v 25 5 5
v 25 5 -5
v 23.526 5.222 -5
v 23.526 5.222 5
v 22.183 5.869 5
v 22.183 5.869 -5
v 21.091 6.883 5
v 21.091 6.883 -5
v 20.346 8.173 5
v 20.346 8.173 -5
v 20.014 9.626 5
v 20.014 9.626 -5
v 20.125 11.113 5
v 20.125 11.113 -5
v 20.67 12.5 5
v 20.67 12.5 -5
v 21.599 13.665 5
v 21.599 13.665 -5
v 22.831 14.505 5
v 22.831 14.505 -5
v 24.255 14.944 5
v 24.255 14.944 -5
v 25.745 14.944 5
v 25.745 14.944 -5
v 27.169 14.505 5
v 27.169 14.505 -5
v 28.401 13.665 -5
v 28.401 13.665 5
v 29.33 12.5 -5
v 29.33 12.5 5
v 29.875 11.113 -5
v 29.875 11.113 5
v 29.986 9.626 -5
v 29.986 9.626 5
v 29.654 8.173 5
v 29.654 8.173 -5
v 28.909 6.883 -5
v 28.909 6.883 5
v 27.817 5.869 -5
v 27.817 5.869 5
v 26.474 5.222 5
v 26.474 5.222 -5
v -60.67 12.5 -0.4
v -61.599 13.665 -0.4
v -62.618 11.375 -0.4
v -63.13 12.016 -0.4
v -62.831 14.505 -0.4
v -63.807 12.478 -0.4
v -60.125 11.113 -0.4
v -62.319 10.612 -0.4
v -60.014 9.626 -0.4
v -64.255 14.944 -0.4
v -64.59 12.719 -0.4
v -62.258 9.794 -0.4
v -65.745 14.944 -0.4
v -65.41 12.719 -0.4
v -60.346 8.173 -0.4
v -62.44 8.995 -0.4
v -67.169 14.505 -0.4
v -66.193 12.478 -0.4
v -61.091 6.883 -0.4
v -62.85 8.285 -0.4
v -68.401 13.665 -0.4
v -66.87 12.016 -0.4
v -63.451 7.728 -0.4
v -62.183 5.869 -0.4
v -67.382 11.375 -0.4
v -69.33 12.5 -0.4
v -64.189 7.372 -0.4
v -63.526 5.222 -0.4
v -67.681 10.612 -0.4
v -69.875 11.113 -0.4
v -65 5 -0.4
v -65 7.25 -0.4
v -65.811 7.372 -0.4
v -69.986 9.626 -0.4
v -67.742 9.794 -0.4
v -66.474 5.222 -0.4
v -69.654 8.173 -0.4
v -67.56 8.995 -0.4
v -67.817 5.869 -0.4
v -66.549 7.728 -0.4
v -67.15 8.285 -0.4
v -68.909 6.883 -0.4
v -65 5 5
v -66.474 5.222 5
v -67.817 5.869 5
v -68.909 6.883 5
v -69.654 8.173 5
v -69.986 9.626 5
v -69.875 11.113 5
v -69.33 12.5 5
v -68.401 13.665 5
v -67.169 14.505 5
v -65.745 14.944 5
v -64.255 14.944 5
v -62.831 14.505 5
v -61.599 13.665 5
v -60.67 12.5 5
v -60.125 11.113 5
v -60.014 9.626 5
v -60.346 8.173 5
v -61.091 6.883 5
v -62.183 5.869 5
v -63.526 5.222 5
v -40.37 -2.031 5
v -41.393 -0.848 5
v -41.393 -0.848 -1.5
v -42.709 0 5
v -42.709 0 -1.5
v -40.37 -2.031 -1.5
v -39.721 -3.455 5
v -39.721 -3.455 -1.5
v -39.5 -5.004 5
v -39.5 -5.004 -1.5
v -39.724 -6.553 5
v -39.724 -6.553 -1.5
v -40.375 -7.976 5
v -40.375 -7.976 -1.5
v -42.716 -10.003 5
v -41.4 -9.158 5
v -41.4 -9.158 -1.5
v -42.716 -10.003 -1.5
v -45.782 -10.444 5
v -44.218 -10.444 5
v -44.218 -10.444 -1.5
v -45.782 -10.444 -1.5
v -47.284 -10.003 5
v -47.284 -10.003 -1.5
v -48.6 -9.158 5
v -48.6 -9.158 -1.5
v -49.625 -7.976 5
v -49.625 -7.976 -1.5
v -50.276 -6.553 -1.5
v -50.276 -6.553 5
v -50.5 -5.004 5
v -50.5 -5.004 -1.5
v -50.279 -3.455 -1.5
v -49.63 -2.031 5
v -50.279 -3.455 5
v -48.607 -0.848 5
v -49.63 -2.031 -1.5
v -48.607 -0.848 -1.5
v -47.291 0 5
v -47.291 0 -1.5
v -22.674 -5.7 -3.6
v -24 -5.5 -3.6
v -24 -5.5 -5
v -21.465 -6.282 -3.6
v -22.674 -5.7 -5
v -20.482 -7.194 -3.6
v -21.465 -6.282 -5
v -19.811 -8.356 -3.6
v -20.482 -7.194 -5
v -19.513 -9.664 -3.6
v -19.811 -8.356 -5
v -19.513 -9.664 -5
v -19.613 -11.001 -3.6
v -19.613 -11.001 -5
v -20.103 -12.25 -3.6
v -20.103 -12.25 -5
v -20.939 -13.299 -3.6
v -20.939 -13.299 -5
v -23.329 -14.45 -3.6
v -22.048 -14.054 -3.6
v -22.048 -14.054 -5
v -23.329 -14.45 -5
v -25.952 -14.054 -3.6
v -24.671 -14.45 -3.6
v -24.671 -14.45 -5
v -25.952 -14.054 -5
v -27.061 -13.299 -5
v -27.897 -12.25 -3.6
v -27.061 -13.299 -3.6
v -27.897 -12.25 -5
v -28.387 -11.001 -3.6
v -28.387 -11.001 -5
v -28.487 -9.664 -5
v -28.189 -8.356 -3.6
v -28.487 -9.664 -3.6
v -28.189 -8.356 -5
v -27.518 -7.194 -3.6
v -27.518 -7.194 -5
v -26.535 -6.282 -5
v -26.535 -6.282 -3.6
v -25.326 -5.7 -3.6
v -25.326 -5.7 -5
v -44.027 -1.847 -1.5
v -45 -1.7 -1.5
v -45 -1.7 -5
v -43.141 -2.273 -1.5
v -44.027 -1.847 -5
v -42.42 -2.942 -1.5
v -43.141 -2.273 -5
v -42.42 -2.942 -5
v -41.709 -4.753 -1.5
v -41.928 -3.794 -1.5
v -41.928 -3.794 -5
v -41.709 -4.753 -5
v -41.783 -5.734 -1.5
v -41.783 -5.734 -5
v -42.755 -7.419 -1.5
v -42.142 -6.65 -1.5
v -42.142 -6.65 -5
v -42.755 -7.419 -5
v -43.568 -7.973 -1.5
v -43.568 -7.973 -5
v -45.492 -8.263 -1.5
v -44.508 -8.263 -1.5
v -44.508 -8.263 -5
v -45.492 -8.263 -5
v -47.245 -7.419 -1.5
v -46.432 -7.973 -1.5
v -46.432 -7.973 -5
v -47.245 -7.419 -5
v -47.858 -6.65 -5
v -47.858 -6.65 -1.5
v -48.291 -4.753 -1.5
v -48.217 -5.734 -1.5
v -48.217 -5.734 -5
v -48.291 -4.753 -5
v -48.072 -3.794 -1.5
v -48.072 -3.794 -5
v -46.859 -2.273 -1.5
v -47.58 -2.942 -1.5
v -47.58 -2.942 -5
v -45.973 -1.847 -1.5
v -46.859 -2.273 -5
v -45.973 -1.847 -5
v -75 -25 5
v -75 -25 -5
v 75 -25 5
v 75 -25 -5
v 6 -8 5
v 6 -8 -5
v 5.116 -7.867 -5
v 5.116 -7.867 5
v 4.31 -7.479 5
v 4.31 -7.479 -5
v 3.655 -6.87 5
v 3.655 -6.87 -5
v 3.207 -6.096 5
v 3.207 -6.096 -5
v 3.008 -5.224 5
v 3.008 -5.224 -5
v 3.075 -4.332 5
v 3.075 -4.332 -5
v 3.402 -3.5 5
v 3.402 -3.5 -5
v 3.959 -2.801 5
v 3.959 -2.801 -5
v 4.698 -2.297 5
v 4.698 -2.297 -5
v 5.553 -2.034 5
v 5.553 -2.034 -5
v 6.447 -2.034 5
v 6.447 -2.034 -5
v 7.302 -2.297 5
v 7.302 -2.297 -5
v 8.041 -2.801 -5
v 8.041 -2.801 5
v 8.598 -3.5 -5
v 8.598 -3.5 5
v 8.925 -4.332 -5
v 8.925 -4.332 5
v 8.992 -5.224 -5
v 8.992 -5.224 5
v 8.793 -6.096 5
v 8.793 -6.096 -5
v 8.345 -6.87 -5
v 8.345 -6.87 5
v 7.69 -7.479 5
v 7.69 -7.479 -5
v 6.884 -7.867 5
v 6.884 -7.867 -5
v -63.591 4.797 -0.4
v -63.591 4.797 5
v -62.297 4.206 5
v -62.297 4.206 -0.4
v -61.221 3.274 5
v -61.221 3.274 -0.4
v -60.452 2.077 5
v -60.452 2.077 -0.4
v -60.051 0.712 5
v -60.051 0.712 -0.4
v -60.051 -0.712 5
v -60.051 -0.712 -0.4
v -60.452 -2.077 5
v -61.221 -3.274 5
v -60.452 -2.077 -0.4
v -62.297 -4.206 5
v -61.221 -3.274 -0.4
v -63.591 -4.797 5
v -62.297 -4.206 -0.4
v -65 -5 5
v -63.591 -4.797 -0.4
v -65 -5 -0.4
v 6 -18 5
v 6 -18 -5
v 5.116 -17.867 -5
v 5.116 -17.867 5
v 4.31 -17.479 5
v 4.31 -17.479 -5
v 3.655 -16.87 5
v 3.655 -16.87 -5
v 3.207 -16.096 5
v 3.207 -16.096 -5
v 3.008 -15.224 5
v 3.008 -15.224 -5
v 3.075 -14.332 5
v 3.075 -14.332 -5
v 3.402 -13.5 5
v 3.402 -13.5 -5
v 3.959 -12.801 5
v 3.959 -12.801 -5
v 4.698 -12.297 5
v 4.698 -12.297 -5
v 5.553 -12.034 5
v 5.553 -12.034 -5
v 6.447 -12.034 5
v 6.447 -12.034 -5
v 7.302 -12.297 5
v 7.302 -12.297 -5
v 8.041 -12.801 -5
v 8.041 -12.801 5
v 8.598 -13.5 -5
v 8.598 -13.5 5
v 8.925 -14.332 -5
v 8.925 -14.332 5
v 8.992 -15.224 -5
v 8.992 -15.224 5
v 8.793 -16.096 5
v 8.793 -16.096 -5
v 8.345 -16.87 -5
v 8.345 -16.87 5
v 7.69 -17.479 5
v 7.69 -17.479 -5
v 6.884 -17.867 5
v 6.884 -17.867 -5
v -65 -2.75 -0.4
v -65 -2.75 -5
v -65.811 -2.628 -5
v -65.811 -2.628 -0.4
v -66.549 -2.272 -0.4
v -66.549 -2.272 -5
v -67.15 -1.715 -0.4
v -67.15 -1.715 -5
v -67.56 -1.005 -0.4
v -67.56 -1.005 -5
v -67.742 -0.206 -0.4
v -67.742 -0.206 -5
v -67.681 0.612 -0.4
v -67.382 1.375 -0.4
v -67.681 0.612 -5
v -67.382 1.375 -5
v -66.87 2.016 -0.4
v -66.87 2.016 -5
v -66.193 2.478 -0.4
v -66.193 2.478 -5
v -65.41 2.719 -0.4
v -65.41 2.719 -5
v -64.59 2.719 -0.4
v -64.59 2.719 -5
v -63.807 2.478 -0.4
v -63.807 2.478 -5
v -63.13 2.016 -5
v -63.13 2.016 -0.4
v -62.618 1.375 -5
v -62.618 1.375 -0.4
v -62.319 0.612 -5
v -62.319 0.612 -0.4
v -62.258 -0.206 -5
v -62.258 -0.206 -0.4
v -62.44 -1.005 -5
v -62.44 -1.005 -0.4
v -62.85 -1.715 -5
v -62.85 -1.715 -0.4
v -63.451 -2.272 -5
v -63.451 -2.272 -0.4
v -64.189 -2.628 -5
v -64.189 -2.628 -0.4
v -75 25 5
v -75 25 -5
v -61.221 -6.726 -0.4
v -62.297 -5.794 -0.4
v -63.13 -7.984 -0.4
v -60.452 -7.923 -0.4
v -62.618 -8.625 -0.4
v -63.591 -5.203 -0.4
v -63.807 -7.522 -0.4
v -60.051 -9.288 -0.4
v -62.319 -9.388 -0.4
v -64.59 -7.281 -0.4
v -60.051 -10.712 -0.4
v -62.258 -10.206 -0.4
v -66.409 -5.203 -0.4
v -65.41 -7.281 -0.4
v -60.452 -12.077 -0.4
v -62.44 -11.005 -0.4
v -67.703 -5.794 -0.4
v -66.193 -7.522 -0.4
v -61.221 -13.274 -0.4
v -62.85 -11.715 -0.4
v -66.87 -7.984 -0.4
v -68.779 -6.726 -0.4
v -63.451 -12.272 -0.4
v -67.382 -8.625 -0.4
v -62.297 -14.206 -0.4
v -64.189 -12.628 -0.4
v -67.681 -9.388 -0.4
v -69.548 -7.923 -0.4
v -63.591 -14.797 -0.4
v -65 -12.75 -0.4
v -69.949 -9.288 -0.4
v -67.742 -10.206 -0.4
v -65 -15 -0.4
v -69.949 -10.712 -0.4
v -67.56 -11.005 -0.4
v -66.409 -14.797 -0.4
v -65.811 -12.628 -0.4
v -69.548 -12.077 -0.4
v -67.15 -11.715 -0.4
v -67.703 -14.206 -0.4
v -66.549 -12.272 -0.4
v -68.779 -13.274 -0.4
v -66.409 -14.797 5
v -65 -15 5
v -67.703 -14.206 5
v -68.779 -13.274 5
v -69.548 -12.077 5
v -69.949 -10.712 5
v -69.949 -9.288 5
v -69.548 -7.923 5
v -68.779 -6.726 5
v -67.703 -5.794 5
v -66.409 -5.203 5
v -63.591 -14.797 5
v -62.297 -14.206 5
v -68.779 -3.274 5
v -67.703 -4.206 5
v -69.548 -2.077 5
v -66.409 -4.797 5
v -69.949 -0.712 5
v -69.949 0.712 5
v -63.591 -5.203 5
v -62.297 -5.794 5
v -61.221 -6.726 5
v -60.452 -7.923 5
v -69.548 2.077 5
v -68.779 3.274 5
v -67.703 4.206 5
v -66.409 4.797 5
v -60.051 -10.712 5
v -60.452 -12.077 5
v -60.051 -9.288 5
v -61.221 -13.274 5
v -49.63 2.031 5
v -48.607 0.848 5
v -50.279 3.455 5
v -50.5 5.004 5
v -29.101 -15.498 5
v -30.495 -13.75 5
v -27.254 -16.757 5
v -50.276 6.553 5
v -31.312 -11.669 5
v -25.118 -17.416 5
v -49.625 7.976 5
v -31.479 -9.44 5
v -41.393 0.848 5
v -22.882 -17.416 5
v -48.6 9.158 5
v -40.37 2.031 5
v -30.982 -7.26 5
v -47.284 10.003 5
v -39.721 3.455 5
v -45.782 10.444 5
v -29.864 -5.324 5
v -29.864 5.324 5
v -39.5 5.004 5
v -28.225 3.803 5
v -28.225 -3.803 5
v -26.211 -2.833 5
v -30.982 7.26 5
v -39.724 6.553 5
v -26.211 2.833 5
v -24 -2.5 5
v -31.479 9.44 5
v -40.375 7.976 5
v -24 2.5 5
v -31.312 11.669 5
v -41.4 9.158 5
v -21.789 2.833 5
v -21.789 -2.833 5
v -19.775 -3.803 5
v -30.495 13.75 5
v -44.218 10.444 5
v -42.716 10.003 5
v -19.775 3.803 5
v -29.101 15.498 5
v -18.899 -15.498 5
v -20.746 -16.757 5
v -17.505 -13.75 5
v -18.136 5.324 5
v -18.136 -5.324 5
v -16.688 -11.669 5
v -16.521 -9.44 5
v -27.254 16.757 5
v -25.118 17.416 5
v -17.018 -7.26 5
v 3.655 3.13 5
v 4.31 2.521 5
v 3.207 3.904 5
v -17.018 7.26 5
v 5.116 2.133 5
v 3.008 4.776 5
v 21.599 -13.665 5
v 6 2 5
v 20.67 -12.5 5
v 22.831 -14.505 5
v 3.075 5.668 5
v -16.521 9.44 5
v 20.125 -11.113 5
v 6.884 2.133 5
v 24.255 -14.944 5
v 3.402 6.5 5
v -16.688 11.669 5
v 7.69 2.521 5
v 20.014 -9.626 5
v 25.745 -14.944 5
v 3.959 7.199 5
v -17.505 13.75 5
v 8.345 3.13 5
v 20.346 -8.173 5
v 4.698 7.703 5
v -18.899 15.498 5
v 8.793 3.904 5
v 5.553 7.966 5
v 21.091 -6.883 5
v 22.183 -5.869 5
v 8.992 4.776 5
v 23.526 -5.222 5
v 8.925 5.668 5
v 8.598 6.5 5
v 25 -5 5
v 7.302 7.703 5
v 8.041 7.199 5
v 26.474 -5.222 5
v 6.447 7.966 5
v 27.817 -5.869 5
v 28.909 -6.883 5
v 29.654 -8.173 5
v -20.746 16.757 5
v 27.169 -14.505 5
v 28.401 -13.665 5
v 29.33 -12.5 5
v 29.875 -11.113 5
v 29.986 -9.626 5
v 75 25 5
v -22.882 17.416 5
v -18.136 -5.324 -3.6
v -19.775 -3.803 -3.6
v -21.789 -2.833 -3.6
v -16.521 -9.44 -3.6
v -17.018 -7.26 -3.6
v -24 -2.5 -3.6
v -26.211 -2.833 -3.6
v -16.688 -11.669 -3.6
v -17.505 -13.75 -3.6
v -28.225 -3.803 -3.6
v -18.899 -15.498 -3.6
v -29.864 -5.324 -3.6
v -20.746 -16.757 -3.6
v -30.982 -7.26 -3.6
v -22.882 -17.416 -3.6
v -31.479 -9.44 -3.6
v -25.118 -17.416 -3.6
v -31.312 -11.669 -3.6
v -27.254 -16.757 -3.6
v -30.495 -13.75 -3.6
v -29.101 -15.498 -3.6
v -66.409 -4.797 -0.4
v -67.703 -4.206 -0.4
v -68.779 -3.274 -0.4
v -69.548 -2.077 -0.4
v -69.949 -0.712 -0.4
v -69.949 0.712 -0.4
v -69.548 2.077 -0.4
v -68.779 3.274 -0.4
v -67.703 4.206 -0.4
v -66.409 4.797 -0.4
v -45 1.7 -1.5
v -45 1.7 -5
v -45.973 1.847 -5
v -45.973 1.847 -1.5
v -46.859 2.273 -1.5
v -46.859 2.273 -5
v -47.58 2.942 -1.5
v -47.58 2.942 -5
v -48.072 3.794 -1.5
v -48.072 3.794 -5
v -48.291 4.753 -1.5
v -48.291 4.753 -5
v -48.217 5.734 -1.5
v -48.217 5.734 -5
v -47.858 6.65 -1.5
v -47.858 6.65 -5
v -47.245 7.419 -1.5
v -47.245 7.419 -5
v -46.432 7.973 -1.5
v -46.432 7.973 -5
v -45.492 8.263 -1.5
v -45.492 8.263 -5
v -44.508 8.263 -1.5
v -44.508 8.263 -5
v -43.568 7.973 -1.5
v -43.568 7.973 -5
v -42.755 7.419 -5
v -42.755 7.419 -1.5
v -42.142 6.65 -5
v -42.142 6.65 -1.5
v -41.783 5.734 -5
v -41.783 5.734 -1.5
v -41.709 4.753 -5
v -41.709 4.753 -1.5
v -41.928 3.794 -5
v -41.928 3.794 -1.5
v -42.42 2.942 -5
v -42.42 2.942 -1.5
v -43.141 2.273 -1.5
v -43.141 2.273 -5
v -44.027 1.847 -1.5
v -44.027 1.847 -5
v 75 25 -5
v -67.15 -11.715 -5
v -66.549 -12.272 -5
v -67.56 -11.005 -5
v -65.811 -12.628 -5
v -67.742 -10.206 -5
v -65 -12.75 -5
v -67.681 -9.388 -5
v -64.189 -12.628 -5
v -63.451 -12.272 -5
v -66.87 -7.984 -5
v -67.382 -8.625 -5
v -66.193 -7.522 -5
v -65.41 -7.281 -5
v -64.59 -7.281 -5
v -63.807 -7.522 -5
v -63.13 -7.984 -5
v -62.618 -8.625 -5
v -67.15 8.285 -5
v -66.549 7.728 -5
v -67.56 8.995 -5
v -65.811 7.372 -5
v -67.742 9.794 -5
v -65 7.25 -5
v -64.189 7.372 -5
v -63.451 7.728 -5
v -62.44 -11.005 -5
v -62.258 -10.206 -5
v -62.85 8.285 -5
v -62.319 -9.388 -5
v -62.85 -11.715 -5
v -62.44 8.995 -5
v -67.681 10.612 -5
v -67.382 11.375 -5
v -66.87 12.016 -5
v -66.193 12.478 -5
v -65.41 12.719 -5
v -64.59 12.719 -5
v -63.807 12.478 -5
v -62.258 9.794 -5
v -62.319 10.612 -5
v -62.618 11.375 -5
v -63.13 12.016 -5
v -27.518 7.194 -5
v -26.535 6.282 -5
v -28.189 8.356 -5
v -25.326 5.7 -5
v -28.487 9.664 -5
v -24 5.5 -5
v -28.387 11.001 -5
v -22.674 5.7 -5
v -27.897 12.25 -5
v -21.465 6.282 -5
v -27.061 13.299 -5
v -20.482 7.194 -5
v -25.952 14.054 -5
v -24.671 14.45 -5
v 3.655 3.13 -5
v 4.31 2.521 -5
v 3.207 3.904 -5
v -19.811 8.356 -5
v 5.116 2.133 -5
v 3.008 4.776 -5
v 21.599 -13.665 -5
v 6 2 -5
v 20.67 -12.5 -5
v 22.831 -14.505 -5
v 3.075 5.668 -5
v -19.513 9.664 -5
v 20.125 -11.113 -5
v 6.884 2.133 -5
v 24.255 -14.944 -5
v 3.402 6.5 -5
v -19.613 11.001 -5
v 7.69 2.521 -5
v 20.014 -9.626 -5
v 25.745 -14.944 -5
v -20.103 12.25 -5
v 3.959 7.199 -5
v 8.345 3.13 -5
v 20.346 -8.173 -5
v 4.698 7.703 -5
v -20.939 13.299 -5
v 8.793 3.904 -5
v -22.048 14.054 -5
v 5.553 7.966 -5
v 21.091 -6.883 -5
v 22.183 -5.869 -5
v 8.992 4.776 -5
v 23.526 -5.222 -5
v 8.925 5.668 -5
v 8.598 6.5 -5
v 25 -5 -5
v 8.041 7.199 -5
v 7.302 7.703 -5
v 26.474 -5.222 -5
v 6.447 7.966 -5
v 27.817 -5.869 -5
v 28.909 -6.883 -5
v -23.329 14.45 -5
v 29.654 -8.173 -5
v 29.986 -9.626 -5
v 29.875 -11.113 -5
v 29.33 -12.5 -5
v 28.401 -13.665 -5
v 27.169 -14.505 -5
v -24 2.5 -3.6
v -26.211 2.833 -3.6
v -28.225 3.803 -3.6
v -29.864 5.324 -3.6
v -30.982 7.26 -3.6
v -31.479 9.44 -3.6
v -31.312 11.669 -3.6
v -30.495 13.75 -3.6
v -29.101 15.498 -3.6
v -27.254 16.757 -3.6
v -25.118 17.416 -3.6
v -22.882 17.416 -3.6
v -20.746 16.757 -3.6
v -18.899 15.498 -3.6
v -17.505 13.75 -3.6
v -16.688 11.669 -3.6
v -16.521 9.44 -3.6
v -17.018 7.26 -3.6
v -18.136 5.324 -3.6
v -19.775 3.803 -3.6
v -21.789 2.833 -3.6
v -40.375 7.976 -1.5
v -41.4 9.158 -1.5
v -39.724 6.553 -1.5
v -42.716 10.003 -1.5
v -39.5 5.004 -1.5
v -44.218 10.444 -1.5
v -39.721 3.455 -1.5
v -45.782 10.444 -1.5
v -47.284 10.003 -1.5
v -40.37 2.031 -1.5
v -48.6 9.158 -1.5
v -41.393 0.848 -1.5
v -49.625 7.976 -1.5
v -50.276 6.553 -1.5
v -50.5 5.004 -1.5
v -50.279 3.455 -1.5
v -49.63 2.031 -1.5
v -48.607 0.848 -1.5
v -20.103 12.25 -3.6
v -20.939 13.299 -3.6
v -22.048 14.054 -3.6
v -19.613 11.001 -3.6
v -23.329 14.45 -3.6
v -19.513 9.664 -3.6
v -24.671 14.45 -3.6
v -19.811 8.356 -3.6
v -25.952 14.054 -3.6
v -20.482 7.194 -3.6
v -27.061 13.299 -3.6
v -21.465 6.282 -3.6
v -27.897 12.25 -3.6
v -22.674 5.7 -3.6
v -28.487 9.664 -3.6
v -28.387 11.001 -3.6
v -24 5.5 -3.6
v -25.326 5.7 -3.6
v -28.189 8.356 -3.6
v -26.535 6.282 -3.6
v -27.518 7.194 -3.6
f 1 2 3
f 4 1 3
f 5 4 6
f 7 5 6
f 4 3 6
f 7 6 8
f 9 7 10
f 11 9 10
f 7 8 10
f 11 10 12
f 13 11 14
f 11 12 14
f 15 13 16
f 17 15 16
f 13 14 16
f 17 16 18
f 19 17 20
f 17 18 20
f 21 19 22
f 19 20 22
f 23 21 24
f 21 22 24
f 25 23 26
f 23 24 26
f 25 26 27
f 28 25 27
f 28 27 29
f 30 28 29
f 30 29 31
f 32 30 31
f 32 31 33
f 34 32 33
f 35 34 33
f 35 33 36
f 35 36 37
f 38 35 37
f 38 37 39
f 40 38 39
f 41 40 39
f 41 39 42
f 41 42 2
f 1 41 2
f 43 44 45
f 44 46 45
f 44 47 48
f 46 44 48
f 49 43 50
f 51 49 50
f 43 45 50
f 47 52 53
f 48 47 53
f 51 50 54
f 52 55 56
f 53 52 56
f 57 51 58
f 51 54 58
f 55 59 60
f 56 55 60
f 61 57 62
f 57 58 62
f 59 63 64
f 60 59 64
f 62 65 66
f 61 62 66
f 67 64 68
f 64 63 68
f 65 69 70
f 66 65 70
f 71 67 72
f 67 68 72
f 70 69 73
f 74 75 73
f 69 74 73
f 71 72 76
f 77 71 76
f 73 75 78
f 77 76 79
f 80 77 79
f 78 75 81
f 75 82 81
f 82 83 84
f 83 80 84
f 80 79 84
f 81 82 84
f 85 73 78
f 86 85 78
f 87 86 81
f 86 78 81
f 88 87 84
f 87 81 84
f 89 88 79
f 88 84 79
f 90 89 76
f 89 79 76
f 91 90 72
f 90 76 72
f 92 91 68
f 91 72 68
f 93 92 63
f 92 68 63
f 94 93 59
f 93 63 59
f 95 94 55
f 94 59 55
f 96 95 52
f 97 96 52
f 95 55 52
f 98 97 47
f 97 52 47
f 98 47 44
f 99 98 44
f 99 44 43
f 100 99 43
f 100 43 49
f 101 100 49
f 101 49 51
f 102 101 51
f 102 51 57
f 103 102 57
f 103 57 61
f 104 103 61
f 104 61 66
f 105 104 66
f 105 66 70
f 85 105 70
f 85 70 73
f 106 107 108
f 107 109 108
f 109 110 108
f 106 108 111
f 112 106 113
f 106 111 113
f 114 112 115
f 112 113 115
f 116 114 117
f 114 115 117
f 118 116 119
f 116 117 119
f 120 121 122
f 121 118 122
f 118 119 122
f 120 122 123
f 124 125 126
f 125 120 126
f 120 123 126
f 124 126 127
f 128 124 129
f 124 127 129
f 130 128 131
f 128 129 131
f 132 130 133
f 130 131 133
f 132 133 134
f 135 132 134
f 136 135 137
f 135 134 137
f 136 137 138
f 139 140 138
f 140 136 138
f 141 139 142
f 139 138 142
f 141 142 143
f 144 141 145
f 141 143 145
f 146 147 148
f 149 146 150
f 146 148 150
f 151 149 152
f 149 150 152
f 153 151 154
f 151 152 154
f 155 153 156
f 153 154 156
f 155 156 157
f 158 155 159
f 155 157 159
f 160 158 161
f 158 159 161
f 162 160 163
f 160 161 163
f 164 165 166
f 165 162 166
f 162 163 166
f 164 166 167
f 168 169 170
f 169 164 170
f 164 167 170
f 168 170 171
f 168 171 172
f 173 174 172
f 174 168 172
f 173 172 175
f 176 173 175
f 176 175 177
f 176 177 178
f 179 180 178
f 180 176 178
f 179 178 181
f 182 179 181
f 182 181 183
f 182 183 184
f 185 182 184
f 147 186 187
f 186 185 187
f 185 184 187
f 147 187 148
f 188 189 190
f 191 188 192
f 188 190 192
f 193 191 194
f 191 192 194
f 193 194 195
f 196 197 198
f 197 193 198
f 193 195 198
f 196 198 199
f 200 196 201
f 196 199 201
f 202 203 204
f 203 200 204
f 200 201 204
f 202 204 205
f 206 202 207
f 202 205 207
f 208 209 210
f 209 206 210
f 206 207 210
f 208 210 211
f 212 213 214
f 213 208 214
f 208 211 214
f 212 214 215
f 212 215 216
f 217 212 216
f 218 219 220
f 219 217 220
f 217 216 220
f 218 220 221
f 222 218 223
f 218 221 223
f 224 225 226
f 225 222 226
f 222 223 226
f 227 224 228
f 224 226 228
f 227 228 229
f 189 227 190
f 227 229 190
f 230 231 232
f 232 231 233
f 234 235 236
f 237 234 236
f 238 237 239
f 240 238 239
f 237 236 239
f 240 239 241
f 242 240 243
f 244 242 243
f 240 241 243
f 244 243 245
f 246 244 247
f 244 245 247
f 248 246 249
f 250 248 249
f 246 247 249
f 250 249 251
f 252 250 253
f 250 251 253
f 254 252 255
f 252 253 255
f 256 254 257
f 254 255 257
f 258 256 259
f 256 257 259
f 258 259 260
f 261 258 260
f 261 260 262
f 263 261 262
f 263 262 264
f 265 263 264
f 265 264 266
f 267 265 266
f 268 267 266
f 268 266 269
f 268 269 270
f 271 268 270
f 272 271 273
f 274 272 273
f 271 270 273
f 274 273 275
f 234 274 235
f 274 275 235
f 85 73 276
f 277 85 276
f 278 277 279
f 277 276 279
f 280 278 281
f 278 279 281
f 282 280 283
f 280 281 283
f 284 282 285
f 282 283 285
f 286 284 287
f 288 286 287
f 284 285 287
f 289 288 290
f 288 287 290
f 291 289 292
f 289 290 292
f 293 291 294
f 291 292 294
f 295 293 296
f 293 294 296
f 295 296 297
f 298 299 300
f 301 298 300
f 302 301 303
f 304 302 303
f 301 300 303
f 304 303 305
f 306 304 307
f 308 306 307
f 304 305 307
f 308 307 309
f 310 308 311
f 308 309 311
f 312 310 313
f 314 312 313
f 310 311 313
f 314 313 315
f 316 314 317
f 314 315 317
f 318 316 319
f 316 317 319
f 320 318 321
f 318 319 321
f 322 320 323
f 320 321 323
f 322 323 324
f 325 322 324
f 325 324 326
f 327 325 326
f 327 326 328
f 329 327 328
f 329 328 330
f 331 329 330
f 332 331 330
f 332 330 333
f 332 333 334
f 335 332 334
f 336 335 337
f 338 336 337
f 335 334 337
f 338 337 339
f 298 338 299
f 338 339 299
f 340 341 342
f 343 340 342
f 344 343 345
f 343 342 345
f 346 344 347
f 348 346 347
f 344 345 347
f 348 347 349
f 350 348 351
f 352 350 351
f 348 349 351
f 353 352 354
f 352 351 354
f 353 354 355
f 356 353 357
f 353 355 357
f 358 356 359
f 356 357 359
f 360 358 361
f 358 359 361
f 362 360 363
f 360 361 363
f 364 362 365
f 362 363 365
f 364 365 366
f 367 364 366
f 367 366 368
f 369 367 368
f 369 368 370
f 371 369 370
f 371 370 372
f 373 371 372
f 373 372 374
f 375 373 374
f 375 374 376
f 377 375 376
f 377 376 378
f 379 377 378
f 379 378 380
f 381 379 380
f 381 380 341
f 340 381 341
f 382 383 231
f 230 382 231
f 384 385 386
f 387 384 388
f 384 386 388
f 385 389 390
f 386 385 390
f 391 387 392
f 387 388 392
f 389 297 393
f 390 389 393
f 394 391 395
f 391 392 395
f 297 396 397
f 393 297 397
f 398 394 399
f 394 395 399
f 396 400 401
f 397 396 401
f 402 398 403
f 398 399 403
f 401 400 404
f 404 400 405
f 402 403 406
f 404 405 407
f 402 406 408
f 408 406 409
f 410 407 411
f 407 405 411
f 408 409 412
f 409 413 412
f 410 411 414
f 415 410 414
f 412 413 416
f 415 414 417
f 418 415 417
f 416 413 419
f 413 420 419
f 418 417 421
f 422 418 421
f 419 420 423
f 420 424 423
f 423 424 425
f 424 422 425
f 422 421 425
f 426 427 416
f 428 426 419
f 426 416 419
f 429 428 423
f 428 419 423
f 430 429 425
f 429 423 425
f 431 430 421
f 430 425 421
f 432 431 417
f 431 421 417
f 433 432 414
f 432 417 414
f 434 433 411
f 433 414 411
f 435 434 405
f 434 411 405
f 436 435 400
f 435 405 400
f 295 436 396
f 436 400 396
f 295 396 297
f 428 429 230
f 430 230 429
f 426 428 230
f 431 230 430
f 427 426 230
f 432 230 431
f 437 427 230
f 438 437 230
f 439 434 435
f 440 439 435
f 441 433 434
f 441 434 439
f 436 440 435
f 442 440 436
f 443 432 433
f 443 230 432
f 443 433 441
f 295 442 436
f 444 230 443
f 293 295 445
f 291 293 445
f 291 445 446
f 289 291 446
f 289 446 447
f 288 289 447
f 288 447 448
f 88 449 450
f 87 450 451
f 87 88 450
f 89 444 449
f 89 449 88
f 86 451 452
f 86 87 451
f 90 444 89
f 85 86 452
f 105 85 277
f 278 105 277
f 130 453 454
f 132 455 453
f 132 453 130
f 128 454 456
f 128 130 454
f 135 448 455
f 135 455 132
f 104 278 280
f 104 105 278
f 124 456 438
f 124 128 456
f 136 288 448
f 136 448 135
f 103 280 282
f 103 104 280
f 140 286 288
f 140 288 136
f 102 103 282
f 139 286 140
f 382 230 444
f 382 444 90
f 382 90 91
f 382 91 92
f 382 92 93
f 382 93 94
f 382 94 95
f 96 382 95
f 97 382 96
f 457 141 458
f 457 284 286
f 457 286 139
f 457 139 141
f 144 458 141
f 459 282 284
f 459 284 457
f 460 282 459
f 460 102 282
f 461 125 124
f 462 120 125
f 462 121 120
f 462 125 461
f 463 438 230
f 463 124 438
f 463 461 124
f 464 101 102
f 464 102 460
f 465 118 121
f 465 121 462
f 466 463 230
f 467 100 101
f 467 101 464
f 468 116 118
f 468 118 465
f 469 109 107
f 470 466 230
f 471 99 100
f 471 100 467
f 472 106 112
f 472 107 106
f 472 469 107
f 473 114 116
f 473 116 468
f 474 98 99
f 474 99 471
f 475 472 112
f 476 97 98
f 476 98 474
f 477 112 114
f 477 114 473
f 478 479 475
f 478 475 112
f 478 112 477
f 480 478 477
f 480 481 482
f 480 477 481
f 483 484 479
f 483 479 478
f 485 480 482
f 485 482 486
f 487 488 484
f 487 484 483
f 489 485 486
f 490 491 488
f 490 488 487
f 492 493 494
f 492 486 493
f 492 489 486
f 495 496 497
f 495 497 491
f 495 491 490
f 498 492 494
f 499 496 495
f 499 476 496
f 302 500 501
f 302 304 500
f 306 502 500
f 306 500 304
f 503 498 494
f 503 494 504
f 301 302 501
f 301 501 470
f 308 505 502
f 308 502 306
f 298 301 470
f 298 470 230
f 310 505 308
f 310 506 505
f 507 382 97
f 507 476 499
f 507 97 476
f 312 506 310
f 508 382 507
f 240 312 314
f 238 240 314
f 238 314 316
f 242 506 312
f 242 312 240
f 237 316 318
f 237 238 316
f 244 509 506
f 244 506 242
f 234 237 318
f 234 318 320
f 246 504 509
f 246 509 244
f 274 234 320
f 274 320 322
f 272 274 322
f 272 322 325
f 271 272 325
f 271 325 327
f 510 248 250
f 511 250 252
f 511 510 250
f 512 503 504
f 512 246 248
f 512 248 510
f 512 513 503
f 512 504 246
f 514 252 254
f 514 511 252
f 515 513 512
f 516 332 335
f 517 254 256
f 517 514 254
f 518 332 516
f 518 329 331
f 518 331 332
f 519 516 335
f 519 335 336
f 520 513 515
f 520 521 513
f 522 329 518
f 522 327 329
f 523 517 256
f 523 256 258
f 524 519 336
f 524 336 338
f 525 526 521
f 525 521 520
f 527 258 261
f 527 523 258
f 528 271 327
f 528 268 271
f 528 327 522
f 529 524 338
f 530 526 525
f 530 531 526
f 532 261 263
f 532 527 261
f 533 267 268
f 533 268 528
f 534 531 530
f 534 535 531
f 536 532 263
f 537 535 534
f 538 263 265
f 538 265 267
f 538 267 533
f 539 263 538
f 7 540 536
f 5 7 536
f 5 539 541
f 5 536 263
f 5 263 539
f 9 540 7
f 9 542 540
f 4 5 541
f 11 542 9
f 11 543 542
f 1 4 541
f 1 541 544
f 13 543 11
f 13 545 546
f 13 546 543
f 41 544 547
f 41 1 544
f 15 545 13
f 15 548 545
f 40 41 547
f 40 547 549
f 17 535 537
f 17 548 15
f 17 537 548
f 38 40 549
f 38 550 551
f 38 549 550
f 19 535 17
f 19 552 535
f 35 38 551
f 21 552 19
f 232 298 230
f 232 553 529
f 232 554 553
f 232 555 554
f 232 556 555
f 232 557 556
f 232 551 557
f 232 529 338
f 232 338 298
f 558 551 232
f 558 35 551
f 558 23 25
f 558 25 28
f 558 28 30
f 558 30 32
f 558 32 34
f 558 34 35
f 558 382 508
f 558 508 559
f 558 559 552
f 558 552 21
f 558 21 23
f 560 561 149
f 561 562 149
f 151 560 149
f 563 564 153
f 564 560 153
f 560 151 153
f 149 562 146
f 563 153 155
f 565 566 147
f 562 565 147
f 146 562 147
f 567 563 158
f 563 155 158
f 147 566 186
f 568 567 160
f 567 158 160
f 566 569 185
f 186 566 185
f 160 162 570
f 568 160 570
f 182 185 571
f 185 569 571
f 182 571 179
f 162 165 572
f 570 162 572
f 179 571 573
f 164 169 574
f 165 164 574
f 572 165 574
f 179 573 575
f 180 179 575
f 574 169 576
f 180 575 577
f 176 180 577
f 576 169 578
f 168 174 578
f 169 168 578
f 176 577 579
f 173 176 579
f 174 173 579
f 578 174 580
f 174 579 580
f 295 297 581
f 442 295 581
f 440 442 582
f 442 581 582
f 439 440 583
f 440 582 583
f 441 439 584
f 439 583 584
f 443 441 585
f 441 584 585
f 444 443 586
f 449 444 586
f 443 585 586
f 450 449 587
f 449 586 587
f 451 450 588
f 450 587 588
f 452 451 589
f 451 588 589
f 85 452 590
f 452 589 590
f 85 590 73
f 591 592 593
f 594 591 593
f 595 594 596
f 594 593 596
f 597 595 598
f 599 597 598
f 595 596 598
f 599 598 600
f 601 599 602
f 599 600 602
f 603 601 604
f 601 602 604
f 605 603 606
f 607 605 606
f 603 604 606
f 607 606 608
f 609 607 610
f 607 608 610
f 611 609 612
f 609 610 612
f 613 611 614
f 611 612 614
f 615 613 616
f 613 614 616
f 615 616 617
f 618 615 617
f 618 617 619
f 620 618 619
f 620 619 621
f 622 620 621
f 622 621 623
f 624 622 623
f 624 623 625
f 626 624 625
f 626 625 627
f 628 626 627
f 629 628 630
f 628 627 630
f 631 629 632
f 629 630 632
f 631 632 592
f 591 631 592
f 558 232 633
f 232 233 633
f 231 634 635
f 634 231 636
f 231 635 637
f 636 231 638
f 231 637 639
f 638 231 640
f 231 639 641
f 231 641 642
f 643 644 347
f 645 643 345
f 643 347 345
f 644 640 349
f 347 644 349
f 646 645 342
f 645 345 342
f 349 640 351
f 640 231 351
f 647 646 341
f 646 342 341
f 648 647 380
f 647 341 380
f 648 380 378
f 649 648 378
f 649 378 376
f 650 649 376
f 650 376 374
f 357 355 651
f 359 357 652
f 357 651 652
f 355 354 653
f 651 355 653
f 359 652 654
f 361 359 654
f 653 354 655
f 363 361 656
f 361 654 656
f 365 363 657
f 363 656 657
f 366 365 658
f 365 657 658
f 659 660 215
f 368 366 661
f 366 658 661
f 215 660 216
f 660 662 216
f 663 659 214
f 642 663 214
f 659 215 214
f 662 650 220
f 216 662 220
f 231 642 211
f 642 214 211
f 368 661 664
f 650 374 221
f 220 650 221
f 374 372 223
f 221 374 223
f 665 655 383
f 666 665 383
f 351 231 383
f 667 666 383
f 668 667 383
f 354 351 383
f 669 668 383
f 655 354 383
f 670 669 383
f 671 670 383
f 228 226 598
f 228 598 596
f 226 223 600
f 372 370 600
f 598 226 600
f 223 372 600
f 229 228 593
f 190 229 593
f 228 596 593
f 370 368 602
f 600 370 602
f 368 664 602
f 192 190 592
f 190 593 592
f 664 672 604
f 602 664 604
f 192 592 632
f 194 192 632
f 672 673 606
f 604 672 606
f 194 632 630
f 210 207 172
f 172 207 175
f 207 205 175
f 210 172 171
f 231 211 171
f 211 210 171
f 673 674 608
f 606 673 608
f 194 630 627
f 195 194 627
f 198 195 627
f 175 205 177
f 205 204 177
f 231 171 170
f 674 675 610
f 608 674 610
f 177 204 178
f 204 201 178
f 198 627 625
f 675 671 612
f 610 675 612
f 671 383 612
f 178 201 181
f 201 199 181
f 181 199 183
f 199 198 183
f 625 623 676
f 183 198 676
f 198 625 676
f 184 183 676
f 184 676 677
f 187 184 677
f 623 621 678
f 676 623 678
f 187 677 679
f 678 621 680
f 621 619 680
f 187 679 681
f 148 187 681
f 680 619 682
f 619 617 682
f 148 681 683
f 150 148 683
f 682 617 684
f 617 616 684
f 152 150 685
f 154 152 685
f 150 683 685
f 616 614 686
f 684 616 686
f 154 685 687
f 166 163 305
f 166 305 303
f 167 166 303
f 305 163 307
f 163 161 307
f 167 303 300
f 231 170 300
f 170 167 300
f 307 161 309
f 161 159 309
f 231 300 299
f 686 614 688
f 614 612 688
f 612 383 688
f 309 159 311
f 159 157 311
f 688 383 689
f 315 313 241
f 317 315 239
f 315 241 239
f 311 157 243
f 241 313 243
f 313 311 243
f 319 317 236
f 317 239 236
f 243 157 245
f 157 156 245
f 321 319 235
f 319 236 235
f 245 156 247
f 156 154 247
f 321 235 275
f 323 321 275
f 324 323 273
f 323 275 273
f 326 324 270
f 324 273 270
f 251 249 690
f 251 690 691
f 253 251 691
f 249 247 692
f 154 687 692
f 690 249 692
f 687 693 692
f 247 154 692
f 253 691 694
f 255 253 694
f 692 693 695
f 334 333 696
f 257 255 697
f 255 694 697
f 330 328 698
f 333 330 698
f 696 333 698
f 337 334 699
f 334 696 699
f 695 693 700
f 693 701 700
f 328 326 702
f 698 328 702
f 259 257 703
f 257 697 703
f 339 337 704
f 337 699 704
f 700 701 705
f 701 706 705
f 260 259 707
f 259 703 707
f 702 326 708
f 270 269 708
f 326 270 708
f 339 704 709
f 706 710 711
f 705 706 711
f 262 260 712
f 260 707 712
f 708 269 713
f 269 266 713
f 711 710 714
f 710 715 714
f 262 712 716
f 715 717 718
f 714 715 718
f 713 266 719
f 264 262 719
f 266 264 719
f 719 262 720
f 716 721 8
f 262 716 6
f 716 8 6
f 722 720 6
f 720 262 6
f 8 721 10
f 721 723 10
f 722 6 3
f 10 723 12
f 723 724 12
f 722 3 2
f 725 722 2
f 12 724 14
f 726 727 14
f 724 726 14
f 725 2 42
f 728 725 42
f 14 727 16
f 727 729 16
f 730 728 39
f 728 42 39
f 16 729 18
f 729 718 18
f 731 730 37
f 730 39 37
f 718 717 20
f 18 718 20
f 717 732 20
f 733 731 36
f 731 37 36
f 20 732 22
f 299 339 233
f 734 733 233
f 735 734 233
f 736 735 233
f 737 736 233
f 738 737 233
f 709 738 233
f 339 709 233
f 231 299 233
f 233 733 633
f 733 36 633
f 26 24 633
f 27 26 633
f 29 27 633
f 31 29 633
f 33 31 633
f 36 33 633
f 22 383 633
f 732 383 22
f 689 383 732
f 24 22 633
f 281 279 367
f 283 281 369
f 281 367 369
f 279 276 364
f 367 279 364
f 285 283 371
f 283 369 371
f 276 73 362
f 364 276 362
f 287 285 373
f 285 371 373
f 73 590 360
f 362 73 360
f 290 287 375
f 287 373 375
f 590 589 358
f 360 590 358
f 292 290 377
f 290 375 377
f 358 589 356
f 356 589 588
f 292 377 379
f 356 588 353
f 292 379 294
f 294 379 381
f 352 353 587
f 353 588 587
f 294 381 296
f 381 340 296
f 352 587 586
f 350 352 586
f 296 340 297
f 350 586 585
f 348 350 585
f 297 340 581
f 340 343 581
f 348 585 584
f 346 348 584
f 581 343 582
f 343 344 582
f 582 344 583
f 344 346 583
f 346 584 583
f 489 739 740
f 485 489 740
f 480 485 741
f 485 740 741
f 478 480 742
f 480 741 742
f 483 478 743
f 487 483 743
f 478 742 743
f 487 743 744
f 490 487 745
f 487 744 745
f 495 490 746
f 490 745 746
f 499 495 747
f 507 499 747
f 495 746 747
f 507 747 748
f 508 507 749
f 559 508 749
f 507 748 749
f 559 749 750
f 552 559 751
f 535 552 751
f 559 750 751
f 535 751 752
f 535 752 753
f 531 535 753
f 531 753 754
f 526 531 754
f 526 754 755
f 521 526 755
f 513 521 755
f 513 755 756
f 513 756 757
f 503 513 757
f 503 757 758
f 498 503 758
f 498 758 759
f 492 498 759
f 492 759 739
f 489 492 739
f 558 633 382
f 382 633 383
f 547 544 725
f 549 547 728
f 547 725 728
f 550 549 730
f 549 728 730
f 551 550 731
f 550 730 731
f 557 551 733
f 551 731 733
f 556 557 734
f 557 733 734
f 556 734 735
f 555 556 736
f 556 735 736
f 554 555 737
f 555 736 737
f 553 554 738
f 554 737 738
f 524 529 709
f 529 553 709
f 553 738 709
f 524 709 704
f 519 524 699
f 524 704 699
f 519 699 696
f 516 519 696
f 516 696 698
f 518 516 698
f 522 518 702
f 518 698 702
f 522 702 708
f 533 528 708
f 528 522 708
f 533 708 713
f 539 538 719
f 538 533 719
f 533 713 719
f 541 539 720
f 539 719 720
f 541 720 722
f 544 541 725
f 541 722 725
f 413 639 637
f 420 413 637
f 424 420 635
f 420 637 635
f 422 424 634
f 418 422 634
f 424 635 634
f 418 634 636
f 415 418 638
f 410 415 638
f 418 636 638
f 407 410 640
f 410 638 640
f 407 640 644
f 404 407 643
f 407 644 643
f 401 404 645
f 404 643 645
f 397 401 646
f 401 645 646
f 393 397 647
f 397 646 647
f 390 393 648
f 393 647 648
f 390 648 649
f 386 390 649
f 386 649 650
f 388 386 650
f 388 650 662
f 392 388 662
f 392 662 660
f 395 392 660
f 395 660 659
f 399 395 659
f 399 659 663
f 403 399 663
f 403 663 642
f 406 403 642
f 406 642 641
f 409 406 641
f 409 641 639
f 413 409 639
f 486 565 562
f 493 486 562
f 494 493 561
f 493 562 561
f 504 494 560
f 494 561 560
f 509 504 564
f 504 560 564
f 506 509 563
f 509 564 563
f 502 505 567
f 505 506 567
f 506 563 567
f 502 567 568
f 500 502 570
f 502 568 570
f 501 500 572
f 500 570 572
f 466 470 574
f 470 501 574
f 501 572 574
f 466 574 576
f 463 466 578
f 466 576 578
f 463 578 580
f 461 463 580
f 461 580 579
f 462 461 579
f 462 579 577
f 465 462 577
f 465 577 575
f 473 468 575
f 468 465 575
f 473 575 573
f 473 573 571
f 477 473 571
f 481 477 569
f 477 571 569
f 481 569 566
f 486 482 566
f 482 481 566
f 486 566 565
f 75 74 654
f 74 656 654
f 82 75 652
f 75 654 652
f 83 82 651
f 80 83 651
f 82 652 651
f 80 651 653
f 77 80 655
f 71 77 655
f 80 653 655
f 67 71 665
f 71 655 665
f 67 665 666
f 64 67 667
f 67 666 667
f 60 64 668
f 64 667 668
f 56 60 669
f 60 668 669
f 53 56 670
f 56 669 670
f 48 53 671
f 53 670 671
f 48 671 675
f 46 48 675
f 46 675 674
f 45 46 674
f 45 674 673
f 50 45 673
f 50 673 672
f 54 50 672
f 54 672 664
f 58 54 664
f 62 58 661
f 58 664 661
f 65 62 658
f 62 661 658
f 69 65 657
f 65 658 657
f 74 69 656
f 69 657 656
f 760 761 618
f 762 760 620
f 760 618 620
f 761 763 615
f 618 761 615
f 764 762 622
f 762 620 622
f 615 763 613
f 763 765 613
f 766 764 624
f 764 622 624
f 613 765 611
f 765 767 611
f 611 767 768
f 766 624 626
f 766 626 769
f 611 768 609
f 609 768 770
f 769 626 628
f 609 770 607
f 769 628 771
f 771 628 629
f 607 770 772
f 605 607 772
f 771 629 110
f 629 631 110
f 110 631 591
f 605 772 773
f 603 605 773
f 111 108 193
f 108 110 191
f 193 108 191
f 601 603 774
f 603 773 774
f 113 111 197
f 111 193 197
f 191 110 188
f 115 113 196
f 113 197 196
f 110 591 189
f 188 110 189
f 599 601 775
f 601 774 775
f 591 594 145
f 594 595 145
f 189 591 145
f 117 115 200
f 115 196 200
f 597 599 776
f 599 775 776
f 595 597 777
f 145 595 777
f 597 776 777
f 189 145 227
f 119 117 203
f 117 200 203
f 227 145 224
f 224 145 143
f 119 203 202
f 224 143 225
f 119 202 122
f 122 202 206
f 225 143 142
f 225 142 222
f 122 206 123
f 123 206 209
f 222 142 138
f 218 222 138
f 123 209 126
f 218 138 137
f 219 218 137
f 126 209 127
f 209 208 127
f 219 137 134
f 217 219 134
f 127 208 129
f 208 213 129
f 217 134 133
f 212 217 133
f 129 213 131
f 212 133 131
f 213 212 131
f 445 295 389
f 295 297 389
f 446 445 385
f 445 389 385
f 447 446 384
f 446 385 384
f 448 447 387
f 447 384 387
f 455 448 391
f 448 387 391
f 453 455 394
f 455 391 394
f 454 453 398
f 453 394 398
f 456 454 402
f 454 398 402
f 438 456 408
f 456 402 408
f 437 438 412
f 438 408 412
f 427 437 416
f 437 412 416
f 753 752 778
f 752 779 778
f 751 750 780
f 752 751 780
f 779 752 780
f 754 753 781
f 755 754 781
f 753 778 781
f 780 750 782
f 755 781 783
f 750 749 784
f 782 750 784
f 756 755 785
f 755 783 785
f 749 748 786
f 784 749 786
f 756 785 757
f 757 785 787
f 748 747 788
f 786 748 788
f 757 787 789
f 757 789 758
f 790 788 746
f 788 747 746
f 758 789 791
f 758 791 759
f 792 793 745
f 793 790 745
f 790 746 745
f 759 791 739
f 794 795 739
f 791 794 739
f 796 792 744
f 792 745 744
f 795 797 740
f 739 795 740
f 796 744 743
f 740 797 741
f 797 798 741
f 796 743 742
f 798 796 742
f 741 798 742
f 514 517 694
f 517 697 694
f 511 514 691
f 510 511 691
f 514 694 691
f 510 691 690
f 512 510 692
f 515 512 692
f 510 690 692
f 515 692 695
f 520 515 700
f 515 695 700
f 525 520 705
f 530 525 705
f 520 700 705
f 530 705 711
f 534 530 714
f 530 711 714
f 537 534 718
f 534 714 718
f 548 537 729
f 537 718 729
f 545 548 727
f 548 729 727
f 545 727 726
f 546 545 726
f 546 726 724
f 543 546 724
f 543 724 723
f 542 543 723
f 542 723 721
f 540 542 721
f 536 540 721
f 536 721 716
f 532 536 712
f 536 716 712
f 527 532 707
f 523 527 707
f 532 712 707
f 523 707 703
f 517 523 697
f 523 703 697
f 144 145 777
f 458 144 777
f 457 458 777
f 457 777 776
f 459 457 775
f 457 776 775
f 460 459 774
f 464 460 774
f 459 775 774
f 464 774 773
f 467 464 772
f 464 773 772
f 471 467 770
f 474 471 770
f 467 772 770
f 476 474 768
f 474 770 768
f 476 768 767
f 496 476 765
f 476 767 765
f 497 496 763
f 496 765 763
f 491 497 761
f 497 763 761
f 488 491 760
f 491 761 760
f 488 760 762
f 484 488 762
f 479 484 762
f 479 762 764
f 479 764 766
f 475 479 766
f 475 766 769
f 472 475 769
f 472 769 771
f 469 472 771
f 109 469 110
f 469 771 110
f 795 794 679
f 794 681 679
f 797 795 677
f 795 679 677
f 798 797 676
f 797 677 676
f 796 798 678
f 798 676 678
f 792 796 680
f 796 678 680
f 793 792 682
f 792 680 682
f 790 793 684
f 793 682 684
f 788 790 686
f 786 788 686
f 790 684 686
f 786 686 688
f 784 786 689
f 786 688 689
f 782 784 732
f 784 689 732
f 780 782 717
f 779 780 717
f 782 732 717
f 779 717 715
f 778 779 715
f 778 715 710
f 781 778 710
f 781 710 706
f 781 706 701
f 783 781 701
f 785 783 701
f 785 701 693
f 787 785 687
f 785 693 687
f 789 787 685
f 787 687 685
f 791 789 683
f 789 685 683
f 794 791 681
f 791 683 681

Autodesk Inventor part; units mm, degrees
ref_plane "YZ Plane" through (0, 0, 0) normal (1, 0, 0) x (0, 1, 0)
ref_plane "XZ Plane" through (0, 0, 0) normal (0, 1, 0) x (-1, 0, 0)
ref_plane "XY Plane" through (0, 0, 0) normal (0, 0, 1) x (1, 0, 0)
sketch "Sketch2" plane through (0, 0, 0) normal (0, 0, 1) x (1, 0, 0)
  line L0 (-75, -25) -> (75, -25)
  line L1 (75, -25) -> (75, 25)
  line L2 (75, 25) -> (-75, 25)
  line L3 (-75, 25) -> (-75, -25)
  line L4 (-75, -25) -> (75, 25) construction
  line L5 (75, -25) -> (-75, 25) construction
  point P0 (0, 0)
  dimension "d1" = 150
  dimension "d2" = 50
extrude "Extrusion1" add sketch "Sketch2" along normal mid plane 10
sketch "Sketch3" plane through (0, 0, 5) normal (0, 0, 1) x (1, 0, 0)
  line L0 (-75, 25) -> (-75, -25) projected
  line L1 (75, 25) -> (-75, 25) projected
  point P0 (0, 0)
  point P1 (-65, 0)
  dimension "d40" = 10
  dimension "d43" = 25
hole "Hole1" at (-65, 0, 5) direction (0, 0, -1) diameter 5.5 depth 14.2 tip angle 118 counterbore diameter 10 counterbore depth 5.4 clearance for "Socket Head Cap Screw" size "M5" standard "TS Profile"
sketch "Sketch4" plane through (0, 0, 5) normal (0, 0, 1) x (1, 0, 0)
  line L0 (-75, 25) -> (-75, -25) projected
  line L1 (75, 25) -> (-75, 25) projected
  point P0 (0, 0)
  point P1 (-45, 5)
  dimension "d41" = 30
  dimension "d42" = 20
hole "Hole2" at (-45, 5, 5) direction (0, 0, -1) diameter 6.6 depth 17.1 tip angle 118 counterbore diameter 11 counterbore depth 6.5 clearance for "Socket Head Cap Screw" size "M6" standard "TS Profile"
sketch "Sketch5" plane through (0, 0, 5) normal (0, 0, 1) x (1, 0, 0)
  line L0 (-75, 25) -> (-75, -25) projected
  line L1 (75, 25) -> (-75, 25) projected
  point P0 (0, 0)
  point P1 (-24, 10)
  dimension "d44" = 51
  dimension "d45" = 15
hole "Hole3" at (-24, 10, 5) direction (0, 0, -1) diameter 9 depth 22.2 tip angle 118 counterbore diameter 15 counterbore depth 8.6 clearance for "Socket Head Cap Screw" size "M8" standard "TS Profile"
sketch "Sketch6" plane through (0, 0, 5) normal (0, 0, 1) x (1, 0, 0)
  line L0 (-75, 25) -> (-75, -25) projected
  line L1 (75, 25) -> (-75, 25) projected
  point P0 (0, 0)
  point P1 (6, 5)
  dimension "d46" = 81
  dimension "d47" = 20
hole "Hole4" at (6, 5, 5) direction (0, 0, -1) diameter 6 depth 14.2 tip angle 118
sketch "Sketch7" plane through (0, 0, 5) normal (0, 0, 1) x (1, 0, 0)
  line L0 (-75, 25) -> (-75, -25) projected
  line L1 (75, 25) -> (-75, 25) projected
  point P0 (0, 0)
  point P1 (25, 10)
  dimension "d48" = 100
  dimension "d49" = 15
hole "Hole5" at (25, 10, 5) direction (0, 0, -1) diameter 10 depth 14.2 tip angle 118
pattern_linear "Rectangular Pattern1" count 3 spacing 10 along (0, -1, 0) of "Hole1" first direction both ways yes
mirror "Mirror1" about plane through (0, 0, 0) normal (0, 1, 0) of "Hole2"
mirror "Mirror2" about plane through (0, 0, 0) normal (0, 1, 0) of "Hole3"
pattern_linear "Rectangular Pattern2" count 3 spacing 10 along (0, -1, 0) of "Hole4"
mirror "Mirror3" about plane through (0, 0, 0) normal (0, 1, 0) of "Hole5"
properties part number "홀간 거리 확인 파트-12" material "SS400"
